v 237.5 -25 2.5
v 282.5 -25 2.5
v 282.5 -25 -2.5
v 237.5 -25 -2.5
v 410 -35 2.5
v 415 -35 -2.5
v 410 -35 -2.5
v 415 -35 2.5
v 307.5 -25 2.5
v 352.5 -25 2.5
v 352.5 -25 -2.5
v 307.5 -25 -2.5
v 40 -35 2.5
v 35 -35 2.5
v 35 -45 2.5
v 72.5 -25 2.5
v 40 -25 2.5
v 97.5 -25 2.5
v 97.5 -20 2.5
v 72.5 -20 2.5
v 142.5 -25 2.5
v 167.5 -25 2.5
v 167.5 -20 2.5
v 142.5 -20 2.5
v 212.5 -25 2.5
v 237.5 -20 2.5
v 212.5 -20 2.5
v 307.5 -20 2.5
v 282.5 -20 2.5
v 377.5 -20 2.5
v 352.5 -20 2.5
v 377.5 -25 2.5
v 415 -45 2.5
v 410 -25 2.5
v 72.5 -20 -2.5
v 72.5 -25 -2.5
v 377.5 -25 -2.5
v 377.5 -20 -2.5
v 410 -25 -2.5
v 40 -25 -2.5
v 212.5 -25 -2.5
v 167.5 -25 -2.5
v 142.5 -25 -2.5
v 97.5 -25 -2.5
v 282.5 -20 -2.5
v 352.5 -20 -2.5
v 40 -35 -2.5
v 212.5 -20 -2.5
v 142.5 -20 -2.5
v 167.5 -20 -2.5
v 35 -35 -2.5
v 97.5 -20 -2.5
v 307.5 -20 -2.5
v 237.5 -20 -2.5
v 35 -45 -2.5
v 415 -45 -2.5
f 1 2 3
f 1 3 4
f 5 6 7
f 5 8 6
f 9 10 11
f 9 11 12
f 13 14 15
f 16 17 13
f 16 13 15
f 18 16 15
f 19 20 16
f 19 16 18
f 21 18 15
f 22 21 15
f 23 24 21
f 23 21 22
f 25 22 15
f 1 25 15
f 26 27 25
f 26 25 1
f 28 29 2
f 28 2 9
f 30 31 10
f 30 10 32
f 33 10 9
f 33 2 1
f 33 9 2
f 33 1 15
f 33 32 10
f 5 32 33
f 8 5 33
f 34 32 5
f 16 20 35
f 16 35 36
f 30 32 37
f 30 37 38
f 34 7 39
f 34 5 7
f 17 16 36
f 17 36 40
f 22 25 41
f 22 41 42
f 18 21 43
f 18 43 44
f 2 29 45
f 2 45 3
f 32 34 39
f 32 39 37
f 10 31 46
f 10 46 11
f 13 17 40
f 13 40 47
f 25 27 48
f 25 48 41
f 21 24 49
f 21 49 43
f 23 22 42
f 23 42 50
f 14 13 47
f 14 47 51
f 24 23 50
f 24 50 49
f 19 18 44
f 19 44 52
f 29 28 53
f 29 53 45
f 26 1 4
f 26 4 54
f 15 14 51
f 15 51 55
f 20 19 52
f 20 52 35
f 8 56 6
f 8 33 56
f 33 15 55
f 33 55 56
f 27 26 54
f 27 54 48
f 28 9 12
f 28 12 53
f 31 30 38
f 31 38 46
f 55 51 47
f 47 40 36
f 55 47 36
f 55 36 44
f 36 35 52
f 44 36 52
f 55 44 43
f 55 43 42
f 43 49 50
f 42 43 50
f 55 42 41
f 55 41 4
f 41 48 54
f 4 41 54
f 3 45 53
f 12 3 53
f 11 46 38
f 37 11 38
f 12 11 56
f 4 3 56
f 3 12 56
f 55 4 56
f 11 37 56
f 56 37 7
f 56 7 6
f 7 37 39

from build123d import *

# Parameters (mm, degrees)
BOSS_EXTRUDE1_DEPTH = 2.5


with BuildPart() as part:
    # Sketch1 → Boss-Extrude1 (new, symmetric)
    with BuildSketch(Plane.XY):
        Polygon((410, -35), (410, -25), (377.5, -25), (377.5, -20), (352.5, -20), (352.5, -25), (307.5, -25), (307.5, -20), (282.5, -20), (282.5, -25), (237.5, -25), (237.5, -20), (212.5, -20), (212.5, -25), (167.5, -25), (167.5, -20), (142.5, -20), (142.5, -25), (97.5, -25), (97.5, -20), (72.5, -20), (72.5, -25), (40, -25), (40, -35), (35, -35), (35, -45), (40, -45), (410, -45), (415, -45), (415, -35), align=None)
    extrude(amount=BOSS_EXTRUDE1_DEPTH, both=True)


solid = part.part
